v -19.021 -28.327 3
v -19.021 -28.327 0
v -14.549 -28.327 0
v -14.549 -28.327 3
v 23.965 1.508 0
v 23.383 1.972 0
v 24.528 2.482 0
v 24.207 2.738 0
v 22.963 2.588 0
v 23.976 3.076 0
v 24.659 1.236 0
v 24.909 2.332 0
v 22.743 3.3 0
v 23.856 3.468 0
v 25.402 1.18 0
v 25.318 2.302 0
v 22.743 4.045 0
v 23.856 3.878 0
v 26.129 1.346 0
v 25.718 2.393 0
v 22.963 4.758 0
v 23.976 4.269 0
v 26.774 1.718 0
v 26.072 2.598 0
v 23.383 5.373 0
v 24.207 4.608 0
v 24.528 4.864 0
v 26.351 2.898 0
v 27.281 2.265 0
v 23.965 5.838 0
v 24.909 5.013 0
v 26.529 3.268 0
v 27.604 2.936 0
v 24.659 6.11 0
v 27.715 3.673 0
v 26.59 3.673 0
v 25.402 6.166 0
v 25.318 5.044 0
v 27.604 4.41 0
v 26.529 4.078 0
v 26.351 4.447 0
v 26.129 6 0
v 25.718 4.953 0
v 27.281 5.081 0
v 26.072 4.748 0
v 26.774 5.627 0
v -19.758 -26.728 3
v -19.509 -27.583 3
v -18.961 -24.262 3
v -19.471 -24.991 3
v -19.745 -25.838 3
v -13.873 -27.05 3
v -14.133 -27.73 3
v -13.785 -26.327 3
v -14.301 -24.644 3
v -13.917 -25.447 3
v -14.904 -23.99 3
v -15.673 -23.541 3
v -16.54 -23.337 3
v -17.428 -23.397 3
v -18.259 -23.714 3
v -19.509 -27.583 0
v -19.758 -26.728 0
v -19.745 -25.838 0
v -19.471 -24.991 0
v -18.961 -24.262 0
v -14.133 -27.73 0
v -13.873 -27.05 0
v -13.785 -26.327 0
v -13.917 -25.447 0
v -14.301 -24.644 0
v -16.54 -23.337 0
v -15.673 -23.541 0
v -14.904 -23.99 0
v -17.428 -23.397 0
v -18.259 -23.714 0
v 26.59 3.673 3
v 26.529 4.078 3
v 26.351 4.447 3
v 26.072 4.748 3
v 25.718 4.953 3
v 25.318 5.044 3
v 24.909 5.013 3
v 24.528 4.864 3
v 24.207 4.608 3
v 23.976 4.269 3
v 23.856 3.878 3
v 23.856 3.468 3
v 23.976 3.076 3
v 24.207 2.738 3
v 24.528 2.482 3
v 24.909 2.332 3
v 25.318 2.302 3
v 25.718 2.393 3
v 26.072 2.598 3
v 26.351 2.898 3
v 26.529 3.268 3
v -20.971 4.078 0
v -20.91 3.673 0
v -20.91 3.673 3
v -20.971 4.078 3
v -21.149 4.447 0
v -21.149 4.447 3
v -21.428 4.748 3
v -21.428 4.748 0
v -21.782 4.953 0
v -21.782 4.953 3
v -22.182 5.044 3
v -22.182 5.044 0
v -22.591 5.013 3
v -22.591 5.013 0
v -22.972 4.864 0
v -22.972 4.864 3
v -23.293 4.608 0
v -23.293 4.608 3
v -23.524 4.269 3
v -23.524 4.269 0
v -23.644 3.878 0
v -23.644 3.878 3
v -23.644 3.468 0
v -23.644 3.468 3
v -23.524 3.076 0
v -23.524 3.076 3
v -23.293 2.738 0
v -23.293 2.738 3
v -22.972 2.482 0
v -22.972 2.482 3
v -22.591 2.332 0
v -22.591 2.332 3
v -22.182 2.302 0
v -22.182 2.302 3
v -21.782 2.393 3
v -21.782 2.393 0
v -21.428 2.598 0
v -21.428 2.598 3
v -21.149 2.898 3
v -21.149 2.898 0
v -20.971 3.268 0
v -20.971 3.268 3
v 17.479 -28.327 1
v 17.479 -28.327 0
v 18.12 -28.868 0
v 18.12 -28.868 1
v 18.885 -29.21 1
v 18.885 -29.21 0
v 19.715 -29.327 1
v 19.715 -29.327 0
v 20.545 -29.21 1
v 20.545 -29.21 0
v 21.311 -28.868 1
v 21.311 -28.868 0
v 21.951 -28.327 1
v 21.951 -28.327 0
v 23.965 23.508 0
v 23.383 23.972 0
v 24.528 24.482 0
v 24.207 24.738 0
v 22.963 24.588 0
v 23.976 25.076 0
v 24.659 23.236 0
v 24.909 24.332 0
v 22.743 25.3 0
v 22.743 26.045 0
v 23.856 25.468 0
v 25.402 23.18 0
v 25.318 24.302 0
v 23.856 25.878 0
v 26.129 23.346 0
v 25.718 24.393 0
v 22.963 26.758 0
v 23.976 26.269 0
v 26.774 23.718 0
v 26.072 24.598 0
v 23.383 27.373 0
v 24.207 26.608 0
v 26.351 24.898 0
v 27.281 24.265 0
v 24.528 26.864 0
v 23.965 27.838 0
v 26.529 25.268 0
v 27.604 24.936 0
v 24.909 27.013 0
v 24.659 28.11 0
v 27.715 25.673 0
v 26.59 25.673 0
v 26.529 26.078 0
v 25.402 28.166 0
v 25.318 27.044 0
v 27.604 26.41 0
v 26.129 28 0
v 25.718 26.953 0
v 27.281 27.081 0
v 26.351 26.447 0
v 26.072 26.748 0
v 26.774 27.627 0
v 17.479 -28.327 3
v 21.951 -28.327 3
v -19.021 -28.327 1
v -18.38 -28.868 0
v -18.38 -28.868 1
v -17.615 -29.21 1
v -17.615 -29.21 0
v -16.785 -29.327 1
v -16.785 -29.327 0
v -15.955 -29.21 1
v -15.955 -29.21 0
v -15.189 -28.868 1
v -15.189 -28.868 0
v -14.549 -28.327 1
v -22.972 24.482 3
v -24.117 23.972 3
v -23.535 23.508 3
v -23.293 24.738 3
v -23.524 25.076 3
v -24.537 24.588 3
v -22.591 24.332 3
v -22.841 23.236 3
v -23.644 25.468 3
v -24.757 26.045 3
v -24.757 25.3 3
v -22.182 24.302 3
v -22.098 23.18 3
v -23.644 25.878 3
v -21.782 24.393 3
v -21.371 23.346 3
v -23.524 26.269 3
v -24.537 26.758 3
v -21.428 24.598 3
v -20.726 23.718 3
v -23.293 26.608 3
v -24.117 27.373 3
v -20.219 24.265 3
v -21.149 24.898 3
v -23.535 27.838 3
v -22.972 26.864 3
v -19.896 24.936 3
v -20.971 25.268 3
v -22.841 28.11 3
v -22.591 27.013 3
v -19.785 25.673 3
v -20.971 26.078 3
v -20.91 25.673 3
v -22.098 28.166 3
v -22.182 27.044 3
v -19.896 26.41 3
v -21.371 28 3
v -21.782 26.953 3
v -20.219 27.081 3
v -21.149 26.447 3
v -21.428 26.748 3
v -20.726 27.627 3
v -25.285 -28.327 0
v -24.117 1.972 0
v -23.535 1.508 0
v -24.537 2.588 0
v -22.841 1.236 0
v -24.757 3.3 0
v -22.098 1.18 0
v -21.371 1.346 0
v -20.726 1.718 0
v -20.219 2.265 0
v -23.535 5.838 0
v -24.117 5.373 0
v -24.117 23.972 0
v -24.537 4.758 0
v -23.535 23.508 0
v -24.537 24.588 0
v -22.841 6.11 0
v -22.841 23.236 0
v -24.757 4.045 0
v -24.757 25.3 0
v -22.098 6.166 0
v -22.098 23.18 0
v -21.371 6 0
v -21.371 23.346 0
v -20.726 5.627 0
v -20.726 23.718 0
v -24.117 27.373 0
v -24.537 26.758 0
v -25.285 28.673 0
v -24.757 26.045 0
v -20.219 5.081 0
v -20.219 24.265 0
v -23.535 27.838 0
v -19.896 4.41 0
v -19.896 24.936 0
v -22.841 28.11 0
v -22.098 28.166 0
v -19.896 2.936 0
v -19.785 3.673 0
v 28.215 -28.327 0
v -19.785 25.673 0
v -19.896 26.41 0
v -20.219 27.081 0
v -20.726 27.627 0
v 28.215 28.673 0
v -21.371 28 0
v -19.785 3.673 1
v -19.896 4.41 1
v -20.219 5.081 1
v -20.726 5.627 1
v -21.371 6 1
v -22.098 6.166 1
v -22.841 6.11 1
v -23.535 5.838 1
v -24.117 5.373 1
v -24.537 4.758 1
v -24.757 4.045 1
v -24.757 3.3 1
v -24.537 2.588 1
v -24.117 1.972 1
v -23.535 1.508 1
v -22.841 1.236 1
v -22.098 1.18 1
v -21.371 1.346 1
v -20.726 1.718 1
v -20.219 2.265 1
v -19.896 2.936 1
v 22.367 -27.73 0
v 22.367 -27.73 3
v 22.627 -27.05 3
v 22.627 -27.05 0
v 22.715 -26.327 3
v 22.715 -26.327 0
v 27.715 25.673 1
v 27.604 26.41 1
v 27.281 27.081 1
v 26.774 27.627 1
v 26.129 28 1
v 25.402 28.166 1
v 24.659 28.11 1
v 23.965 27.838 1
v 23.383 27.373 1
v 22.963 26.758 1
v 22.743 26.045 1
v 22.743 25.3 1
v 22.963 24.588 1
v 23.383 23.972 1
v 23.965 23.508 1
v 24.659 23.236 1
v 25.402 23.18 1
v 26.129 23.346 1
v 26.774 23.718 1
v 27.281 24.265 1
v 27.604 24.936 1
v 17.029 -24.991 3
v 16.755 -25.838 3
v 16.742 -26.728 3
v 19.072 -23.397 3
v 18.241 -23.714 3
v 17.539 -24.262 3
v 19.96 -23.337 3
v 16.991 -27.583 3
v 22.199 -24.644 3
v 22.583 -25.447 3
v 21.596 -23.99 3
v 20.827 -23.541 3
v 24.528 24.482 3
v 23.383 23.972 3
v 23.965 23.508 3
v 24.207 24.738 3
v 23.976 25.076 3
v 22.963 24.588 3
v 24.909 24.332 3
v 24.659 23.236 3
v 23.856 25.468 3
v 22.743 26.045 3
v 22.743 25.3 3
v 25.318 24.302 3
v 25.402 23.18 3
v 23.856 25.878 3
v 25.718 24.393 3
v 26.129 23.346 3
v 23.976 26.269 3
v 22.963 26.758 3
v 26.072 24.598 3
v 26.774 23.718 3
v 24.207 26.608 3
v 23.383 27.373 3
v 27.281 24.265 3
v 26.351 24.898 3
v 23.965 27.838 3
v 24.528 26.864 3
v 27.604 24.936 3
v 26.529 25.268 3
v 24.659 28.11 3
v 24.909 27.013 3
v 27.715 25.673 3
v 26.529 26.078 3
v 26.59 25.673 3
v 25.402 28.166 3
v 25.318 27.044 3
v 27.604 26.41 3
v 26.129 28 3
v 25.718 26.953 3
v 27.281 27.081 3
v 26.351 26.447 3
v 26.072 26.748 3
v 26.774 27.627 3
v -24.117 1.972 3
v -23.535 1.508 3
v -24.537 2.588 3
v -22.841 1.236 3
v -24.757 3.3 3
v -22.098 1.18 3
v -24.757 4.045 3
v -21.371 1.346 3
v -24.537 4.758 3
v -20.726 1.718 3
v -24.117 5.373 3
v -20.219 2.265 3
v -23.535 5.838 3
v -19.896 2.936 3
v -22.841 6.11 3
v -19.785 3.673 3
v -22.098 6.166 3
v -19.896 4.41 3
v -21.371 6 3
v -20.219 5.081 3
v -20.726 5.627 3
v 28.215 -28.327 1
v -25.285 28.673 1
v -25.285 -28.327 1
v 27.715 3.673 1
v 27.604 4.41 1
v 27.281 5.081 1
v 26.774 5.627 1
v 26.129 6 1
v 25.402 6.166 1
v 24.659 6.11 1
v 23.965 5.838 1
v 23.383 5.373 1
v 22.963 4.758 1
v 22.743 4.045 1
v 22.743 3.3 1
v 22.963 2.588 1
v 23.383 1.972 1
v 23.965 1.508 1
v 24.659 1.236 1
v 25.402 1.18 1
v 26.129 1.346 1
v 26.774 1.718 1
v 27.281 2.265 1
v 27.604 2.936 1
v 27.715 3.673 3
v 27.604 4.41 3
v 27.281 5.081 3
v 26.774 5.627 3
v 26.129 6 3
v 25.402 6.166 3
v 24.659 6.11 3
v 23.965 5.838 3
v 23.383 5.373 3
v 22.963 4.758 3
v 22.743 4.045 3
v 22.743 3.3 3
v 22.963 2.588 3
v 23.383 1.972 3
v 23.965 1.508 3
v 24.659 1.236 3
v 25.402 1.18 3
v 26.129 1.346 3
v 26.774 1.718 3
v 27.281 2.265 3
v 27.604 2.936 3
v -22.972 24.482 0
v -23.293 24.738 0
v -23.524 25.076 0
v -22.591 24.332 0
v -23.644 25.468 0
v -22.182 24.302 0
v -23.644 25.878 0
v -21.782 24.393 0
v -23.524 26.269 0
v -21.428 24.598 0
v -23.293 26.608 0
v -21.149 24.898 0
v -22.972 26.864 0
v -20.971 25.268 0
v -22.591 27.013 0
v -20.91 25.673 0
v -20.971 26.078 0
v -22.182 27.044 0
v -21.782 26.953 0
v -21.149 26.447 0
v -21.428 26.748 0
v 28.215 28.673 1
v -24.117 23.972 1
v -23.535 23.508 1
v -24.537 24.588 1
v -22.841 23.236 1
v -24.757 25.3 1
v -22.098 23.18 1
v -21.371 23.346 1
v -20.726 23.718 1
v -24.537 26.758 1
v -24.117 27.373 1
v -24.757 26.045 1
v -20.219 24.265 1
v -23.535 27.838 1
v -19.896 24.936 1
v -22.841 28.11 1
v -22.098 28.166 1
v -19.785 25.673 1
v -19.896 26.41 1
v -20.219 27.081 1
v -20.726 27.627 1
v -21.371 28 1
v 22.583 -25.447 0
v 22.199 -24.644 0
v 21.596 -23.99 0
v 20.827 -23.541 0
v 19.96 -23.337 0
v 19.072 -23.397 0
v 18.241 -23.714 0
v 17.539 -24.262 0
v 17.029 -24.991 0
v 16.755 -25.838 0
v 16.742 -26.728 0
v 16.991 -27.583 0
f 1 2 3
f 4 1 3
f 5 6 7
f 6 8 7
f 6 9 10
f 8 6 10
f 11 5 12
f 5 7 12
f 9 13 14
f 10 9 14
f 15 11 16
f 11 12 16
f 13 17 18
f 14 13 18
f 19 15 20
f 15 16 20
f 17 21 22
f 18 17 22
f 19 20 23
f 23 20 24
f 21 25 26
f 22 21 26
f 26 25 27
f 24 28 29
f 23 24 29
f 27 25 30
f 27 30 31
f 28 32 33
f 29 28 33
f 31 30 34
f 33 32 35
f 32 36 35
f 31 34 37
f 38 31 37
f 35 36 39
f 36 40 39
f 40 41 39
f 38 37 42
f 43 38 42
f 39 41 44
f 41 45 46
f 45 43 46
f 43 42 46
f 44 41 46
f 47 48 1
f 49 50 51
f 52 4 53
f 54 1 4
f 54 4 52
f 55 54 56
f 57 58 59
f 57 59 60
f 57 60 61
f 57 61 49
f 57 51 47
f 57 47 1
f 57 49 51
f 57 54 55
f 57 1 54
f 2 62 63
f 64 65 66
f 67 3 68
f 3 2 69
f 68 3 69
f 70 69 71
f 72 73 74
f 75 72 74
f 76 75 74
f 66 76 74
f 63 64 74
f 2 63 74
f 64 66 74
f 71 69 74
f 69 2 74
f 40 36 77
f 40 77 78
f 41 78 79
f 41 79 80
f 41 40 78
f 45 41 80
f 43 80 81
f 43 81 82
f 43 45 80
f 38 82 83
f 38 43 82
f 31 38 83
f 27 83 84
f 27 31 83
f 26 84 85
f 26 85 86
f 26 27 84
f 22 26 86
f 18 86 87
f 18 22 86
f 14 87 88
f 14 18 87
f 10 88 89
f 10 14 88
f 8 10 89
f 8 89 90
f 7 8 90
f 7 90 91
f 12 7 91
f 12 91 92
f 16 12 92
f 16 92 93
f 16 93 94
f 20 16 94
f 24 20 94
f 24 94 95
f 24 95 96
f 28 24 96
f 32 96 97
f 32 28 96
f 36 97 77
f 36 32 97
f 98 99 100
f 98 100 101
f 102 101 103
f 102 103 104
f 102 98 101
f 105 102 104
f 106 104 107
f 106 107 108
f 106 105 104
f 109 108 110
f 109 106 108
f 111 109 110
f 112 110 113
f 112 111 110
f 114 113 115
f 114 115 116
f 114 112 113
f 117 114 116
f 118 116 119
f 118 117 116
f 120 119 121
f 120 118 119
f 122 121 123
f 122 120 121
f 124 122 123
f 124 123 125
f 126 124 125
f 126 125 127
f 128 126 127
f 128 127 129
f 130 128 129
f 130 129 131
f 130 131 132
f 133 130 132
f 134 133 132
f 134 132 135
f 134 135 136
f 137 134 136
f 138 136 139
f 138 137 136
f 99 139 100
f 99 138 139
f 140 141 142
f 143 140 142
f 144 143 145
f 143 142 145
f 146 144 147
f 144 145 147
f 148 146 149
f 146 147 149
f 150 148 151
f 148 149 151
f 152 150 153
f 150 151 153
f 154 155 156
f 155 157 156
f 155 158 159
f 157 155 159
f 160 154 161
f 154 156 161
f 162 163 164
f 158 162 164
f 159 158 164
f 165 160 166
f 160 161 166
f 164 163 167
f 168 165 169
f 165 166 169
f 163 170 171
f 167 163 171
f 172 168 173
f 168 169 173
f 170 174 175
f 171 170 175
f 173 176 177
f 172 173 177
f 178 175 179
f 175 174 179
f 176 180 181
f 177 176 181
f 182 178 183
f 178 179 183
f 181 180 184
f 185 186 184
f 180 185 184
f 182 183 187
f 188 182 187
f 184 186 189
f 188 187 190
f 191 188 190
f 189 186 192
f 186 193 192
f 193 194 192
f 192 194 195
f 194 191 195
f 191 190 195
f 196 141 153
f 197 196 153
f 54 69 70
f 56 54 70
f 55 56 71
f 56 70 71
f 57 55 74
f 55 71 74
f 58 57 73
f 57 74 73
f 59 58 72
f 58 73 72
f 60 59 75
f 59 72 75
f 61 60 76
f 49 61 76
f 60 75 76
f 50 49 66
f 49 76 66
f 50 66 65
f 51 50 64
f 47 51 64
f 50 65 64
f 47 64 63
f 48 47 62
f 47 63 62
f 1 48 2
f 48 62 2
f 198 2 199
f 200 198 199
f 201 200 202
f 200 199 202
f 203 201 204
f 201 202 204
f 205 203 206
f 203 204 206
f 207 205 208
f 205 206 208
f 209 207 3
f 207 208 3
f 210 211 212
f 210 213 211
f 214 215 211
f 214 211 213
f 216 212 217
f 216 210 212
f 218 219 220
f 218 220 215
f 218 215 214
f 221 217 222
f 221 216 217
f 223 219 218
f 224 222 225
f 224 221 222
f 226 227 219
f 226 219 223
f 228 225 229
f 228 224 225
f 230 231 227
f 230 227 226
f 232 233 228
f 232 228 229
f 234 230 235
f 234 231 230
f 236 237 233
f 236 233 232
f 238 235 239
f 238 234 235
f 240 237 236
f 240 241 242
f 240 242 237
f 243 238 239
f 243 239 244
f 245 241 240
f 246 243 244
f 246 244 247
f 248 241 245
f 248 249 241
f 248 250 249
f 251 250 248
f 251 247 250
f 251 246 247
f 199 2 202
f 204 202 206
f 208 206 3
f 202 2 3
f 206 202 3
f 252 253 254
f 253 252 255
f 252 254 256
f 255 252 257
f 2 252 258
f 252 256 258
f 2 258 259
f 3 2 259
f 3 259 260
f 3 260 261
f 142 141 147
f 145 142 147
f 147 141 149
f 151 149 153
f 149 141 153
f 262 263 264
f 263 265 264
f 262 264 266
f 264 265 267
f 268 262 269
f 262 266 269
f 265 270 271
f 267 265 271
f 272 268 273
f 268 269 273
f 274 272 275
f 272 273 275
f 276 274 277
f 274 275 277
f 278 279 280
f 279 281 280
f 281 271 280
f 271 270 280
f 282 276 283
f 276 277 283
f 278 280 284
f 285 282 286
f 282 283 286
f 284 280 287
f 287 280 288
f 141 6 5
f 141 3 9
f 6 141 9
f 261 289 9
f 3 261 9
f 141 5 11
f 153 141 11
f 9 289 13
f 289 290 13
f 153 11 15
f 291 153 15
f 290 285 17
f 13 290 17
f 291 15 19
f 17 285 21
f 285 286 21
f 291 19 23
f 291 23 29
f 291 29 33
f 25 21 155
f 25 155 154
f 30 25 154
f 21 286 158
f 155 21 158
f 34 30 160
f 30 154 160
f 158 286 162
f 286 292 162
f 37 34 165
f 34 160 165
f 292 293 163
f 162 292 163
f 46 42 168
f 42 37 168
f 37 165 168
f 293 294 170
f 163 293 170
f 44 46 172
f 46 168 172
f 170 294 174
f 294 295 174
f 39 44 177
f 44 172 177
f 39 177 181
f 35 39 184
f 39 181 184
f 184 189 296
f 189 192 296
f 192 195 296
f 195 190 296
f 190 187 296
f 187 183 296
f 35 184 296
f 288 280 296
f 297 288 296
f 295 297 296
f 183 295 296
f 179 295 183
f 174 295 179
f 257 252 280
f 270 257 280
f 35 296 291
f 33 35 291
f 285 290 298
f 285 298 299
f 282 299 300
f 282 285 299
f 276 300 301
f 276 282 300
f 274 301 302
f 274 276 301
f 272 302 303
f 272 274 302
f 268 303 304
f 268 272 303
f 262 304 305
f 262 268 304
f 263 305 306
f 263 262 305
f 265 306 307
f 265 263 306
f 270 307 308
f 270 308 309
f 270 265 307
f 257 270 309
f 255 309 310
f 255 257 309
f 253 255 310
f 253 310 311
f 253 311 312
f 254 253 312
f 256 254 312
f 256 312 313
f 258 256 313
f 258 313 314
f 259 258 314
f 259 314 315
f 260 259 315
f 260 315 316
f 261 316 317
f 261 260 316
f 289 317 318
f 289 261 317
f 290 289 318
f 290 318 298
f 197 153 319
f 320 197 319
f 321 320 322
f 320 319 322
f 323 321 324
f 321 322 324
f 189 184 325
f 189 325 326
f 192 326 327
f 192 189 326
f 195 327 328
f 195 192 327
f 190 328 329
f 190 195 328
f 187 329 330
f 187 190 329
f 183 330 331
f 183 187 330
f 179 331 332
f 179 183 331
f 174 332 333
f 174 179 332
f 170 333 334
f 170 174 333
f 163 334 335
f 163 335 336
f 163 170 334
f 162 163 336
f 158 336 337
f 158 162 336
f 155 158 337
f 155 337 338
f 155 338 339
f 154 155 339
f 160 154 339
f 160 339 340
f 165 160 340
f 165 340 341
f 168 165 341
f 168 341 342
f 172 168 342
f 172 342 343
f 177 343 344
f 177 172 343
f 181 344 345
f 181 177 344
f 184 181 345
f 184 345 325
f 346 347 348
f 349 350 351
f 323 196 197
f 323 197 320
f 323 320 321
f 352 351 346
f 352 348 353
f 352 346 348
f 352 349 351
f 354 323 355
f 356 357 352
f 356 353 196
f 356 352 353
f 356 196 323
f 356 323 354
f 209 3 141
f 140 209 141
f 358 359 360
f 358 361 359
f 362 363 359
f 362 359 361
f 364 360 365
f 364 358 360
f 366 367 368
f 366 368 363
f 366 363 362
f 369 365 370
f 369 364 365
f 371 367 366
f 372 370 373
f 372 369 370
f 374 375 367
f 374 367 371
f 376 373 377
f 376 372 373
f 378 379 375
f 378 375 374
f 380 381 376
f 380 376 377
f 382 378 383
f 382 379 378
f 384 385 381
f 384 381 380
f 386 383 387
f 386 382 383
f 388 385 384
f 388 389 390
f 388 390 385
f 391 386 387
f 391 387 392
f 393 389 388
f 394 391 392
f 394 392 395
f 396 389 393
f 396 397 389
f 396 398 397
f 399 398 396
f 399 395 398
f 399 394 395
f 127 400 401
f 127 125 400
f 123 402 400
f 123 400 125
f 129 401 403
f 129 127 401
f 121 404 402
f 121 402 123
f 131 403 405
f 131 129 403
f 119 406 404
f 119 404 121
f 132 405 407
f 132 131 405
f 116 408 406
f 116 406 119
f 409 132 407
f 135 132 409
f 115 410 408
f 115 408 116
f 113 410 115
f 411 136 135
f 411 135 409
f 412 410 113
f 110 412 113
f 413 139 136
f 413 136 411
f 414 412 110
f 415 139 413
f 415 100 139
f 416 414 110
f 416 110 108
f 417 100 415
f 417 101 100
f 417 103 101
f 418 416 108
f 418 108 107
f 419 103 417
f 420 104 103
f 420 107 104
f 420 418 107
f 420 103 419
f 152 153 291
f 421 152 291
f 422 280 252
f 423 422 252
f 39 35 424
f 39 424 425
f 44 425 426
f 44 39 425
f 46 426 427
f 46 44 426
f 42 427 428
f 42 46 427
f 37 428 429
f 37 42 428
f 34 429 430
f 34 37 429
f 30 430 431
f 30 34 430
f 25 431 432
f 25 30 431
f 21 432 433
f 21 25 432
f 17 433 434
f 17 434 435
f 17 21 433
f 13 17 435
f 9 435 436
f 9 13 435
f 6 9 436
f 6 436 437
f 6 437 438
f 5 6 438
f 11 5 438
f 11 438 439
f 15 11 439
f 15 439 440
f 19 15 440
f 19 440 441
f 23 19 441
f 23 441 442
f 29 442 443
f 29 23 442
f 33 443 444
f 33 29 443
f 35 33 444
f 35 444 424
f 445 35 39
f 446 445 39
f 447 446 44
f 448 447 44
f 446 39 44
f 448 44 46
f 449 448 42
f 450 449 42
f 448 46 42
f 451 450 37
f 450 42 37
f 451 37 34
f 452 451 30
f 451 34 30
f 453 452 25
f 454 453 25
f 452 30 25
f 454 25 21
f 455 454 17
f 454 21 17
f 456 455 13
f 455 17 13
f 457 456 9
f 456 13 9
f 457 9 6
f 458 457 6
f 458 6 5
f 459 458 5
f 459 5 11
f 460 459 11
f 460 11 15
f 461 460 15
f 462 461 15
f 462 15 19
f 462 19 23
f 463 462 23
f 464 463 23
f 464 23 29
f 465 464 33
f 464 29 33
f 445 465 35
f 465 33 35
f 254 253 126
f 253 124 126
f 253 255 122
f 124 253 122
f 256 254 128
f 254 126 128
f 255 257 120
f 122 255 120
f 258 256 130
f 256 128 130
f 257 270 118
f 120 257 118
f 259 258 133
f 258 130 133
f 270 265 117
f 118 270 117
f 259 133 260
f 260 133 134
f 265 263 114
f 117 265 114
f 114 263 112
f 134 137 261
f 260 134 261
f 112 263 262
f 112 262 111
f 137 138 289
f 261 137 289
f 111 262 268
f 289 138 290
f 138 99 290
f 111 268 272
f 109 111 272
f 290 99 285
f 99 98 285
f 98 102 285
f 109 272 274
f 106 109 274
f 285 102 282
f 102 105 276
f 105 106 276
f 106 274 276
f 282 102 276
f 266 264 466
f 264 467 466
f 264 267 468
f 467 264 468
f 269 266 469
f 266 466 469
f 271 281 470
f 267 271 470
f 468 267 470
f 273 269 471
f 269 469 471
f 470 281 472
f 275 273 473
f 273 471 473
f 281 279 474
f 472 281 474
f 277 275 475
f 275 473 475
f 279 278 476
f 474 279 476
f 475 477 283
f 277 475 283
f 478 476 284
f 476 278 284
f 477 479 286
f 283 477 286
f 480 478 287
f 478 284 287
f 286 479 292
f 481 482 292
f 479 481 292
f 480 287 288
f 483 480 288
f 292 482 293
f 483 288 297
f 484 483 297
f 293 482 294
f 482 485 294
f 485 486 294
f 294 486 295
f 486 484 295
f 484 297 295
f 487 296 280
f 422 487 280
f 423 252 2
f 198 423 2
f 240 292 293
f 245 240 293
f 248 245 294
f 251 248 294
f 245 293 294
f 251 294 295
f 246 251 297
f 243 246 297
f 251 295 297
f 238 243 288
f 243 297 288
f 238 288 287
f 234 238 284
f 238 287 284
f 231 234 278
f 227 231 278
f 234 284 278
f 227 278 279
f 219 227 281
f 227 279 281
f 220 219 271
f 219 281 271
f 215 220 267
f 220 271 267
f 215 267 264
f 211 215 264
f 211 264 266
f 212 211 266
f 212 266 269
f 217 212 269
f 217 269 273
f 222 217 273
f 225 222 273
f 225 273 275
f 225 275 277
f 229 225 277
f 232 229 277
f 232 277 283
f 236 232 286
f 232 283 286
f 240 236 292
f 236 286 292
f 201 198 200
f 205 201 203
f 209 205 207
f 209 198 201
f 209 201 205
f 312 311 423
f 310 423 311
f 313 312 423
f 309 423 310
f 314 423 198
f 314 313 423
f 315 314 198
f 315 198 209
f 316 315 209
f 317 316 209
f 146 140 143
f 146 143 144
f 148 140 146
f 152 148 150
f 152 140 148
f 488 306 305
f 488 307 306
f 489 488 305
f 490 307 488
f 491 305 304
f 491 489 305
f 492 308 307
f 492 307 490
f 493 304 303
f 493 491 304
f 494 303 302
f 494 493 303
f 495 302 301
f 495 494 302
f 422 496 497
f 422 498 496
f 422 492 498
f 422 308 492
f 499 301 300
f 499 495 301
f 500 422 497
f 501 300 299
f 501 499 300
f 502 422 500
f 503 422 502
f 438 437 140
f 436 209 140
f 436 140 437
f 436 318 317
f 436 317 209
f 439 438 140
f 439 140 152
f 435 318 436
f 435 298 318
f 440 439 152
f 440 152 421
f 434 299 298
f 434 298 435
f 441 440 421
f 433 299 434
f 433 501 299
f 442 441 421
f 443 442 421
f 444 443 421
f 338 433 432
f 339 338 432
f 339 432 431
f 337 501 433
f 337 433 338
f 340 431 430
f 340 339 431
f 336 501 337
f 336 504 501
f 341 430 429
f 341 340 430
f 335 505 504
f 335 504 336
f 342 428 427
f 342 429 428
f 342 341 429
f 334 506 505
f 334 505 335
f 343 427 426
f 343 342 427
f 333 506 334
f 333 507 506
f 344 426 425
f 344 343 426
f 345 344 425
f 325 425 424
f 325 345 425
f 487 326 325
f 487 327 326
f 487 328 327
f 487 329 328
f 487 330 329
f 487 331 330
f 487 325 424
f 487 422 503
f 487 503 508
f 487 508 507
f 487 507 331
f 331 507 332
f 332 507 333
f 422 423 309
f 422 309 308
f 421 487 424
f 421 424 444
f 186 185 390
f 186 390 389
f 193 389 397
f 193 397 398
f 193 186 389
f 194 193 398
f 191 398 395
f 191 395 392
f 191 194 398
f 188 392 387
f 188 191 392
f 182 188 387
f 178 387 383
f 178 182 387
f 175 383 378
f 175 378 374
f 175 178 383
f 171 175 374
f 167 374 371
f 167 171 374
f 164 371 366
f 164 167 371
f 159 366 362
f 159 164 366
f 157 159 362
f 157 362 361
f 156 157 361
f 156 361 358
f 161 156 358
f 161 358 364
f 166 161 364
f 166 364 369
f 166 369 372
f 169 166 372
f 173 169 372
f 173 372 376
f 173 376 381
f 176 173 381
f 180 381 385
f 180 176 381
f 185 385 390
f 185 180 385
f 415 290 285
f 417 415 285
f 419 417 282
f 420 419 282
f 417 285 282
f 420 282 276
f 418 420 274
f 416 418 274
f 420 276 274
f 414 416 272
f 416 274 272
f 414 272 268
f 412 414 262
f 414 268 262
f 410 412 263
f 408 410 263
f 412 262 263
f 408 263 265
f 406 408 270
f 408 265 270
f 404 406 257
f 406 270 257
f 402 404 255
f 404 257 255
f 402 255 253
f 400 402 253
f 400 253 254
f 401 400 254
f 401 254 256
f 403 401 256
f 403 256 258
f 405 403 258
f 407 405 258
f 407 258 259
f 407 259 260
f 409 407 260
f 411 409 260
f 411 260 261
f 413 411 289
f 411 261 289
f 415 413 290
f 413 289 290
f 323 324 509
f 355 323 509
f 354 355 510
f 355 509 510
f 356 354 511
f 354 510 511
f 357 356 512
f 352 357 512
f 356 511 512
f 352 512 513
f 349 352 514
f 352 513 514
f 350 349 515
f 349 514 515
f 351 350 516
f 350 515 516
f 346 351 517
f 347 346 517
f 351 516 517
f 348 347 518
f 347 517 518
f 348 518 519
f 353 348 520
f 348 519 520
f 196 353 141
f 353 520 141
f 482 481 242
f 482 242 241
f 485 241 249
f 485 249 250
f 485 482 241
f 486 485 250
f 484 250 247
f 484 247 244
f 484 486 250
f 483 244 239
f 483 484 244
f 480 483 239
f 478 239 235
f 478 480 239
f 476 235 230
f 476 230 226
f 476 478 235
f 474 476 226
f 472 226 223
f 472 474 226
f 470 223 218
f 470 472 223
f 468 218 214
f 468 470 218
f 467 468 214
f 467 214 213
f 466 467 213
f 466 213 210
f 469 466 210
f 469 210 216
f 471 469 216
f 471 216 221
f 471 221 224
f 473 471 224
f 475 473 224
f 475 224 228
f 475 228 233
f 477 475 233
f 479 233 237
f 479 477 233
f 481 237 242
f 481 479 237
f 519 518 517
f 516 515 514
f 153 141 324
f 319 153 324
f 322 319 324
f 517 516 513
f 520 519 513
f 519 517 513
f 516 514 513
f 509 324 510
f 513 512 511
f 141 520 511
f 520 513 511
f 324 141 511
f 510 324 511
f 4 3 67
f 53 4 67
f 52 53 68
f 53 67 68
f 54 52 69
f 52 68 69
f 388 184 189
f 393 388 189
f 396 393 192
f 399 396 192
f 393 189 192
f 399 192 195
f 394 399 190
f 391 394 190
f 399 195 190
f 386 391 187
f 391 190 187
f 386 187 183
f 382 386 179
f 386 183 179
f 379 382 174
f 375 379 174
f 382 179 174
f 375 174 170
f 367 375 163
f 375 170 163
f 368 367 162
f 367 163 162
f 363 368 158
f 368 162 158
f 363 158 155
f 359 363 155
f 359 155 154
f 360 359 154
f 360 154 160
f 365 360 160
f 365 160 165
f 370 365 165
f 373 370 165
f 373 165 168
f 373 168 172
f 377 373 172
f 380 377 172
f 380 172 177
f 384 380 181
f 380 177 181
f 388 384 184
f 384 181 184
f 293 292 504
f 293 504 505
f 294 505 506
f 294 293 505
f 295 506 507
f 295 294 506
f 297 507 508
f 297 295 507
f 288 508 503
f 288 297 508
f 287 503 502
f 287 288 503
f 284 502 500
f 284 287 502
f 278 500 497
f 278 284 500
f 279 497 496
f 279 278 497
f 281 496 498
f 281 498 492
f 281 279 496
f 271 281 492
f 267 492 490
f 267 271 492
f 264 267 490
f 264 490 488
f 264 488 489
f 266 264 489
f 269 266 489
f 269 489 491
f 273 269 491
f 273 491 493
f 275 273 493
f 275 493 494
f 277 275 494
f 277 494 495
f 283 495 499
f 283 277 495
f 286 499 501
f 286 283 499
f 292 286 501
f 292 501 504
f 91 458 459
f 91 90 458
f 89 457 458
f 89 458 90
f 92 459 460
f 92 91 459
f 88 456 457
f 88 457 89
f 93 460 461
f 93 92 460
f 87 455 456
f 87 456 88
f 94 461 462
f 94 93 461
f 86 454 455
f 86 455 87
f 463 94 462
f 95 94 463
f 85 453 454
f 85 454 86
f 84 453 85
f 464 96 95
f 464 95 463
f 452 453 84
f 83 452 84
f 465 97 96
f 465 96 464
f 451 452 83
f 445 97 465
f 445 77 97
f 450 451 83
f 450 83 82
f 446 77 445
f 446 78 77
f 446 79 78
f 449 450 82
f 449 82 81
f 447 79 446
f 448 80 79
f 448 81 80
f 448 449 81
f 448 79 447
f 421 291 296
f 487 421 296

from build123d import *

# Parameters (mm, degrees)
F0_R     = 2.5
F0_R_2   = 1.375
F1_DEPTH = 3
F2_DEPTH = 1


with BuildPart() as f1:
    # F0 (on Top) → F1 (new body)
    with BuildSketch(Plane.XY):
        with Locations((-22.2848404497, 25.6728434441)):
            Circle(F0_R)
        with Locations((-22.2848404497, 25.6728434441)):
            Circle(F0_R_2, mode=Mode.SUBTRACT)
    extrude(amount=F1_DEPTH)


with BuildPart() as f1b:
    # F0 (on Top) → F1, piece 2 (new body)
    with BuildSketch(Plane.XY):
        with Locations((-22.2848404497, 3.6728434441)):
            Circle(F0_R)
        with Locations((-22.2848404497, 3.6728434441)):
            Circle(F0_R_2, mode=Mode.SUBTRACT)
    extrude(amount=F1_DEPTH)


with BuildPart() as f1c:
    # F0 (on Top) → F1, piece 3 (new body)
    with BuildSketch(Plane.XY):
        with Locations((25.2151595503, 3.6728434441)):
            Circle(F0_R)
        with Locations((25.2151595503, 3.6728434441)):
            Circle(F0_R_2, mode=Mode.SUBTRACT)
    extrude(amount=F1_DEPTH)


with BuildPart() as f1d:
    # F0 (on Top) → F1, piece 4 (new body)
    with BuildSketch(Plane.XY):
        with Locations((25.2151595503, 25.6728434441)):
            Circle(F0_R)
        with Locations((25.2151595503, 25.6728434441)):
            Circle(F0_R_2, mode=Mode.SUBTRACT)
    extrude(amount=F1_DEPTH)


with BuildPart() as f1e:
    # F0 (on Top) → F1, piece 5 (new body)
    with BuildSketch(Plane.XY):
        with BuildLine():
            ThreePointArc((-13.7848404497, -26.3271565559), (-17.855306719, -23.524639479), (-19.0209084272, -28.3271565559))
            Line((-19.0209084272, -28.3271565559), (-14.5487724722, -28.3271565559))
            ThreePointArc((-14.5487724722, -28.3271565559), (-13.9823233728, -27.3976228253), (-13.7848404497, -26.3271565559))
        make_face()
    extrude(amount=F1_DEPTH)


with BuildPart() as f1f:
    # F0 (on Top) → F1, piece 6 (new body)
    with BuildSketch(Plane.XY):
        with BuildLine():
            Line((17.4790915728, -28.3271565559), (21.9512275278, -28.3271565559))
            ThreePointArc((21.9512275278, -28.3271565559), (22.5176766272, -27.3976228253), (22.7151595503, -26.3271565559))
            ThreePointArc((22.7151595503, -26.3271565559), (18.644693281, -23.524639479), (17.4790915728, -28.3271565559))
        make_face()
    extrude(amount=F1_DEPTH)


with BuildPart() as f2:
    # F0 (on Top) → F2 (new body)
    with BuildSketch(Plane.XY):
        with BuildLine():
            Line((28.2151595503, 28.6728434441), (-25.2848404497, 28.6728434441))
            Line((-25.2848404497, 28.6728434441), (-25.2848404497, -28.3271565559))
            Line((-25.2848404497, -28.3271565559), (-19.0209084272, -28.3271565559))
            ThreePointArc((-19.0209084272, -28.3271565559), (-17.855306719, -23.524639479), (-13.7848404497, -26.3271565559))
            ThreePointArc((-13.7848404497, -26.3271565559), (-13.9823233728, -27.3976228253), (-14.5487724722, -28.3271565559))
            Line((-14.5487724722, -28.3271565559), (17.4790915728, -28.3271565559))
            ThreePointArc((17.4790915728, -28.3271565559), (18.644693281, -23.524639479), (22.7151595503, -26.3271565559))
            ThreePointArc((22.7151595503, -26.3271565559), (22.5176766272, -27.3976228253), (21.9512275278, -28.3271565559))
            Line((21.9512275278, -28.3271565559), (28.2151595503, -28.3271565559))
            Line((28.2151595503, -28.3271565559), (28.2151595503, 28.6728434441))
        make_face()
        with Locations((-22.2848404497, 3.6728434441)):
            Circle(F0_R, mode=Mode.SUBTRACT)
        with Locations((-22.2848404497, 25.6728434441)):
            Circle(F0_R, mode=Mode.SUBTRACT)
        with Locations((25.2151595503, 3.6728434441)):
            Circle(F0_R, mode=Mode.SUBTRACT)
        with Locations((25.2151595503, 25.6728434441)):
            Circle(F0_R, mode=Mode.SUBTRACT)
        with BuildLine():
            ThreePointArc((-13.7848404497, -26.3271565559), (-17.855306719, -23.524639479), (-19.0209084272, -28.3271565559))
            Line((-19.0209084272, -28.3271565559), (-14.5487724722, -28.3271565559))
            ThreePointArc((-14.5487724722, -28.3271565559), (-13.9823233728, -27.3976228253), (-13.7848404497, -26.3271565559))
        make_face()
        with BuildLine():
            Line((-14.5487724722, -28.3271565559), (-19.0209084272, -28.3271565559))
            ThreePointArc((-19.0209084272, -28.3271565559), (-16.7848404497, -29.3271565559), (-14.5487724722, -28.3271565559))
        make_face()
        with BuildLine():
            ThreePointArc((17.4790915728, -28.3271565559), (19.7151595503, -29.3271565559), (21.9512275278, -28.3271565559))
            Line((21.9512275278, -28.3271565559), (17.4790915728, -28.3271565559))
        make_face()
        with BuildLine():
            Line((17.4790915728, -28.3271565559), (21.9512275278, -28.3271565559))
            ThreePointArc((21.9512275278, -28.3271565559), (22.5176766272, -27.3976228253), (22.7151595503, -26.3271565559))
            ThreePointArc((22.7151595503, -26.3271565559), (18.644693281, -23.524639479), (17.4790915728, -28.3271565559))
        make_face()
    extrude(amount=F2_DEPTH)


solid = Compound([f1.part, f1b.part, f1c.part, f1d.part, f1e.part, f1f.part, f2.part])
